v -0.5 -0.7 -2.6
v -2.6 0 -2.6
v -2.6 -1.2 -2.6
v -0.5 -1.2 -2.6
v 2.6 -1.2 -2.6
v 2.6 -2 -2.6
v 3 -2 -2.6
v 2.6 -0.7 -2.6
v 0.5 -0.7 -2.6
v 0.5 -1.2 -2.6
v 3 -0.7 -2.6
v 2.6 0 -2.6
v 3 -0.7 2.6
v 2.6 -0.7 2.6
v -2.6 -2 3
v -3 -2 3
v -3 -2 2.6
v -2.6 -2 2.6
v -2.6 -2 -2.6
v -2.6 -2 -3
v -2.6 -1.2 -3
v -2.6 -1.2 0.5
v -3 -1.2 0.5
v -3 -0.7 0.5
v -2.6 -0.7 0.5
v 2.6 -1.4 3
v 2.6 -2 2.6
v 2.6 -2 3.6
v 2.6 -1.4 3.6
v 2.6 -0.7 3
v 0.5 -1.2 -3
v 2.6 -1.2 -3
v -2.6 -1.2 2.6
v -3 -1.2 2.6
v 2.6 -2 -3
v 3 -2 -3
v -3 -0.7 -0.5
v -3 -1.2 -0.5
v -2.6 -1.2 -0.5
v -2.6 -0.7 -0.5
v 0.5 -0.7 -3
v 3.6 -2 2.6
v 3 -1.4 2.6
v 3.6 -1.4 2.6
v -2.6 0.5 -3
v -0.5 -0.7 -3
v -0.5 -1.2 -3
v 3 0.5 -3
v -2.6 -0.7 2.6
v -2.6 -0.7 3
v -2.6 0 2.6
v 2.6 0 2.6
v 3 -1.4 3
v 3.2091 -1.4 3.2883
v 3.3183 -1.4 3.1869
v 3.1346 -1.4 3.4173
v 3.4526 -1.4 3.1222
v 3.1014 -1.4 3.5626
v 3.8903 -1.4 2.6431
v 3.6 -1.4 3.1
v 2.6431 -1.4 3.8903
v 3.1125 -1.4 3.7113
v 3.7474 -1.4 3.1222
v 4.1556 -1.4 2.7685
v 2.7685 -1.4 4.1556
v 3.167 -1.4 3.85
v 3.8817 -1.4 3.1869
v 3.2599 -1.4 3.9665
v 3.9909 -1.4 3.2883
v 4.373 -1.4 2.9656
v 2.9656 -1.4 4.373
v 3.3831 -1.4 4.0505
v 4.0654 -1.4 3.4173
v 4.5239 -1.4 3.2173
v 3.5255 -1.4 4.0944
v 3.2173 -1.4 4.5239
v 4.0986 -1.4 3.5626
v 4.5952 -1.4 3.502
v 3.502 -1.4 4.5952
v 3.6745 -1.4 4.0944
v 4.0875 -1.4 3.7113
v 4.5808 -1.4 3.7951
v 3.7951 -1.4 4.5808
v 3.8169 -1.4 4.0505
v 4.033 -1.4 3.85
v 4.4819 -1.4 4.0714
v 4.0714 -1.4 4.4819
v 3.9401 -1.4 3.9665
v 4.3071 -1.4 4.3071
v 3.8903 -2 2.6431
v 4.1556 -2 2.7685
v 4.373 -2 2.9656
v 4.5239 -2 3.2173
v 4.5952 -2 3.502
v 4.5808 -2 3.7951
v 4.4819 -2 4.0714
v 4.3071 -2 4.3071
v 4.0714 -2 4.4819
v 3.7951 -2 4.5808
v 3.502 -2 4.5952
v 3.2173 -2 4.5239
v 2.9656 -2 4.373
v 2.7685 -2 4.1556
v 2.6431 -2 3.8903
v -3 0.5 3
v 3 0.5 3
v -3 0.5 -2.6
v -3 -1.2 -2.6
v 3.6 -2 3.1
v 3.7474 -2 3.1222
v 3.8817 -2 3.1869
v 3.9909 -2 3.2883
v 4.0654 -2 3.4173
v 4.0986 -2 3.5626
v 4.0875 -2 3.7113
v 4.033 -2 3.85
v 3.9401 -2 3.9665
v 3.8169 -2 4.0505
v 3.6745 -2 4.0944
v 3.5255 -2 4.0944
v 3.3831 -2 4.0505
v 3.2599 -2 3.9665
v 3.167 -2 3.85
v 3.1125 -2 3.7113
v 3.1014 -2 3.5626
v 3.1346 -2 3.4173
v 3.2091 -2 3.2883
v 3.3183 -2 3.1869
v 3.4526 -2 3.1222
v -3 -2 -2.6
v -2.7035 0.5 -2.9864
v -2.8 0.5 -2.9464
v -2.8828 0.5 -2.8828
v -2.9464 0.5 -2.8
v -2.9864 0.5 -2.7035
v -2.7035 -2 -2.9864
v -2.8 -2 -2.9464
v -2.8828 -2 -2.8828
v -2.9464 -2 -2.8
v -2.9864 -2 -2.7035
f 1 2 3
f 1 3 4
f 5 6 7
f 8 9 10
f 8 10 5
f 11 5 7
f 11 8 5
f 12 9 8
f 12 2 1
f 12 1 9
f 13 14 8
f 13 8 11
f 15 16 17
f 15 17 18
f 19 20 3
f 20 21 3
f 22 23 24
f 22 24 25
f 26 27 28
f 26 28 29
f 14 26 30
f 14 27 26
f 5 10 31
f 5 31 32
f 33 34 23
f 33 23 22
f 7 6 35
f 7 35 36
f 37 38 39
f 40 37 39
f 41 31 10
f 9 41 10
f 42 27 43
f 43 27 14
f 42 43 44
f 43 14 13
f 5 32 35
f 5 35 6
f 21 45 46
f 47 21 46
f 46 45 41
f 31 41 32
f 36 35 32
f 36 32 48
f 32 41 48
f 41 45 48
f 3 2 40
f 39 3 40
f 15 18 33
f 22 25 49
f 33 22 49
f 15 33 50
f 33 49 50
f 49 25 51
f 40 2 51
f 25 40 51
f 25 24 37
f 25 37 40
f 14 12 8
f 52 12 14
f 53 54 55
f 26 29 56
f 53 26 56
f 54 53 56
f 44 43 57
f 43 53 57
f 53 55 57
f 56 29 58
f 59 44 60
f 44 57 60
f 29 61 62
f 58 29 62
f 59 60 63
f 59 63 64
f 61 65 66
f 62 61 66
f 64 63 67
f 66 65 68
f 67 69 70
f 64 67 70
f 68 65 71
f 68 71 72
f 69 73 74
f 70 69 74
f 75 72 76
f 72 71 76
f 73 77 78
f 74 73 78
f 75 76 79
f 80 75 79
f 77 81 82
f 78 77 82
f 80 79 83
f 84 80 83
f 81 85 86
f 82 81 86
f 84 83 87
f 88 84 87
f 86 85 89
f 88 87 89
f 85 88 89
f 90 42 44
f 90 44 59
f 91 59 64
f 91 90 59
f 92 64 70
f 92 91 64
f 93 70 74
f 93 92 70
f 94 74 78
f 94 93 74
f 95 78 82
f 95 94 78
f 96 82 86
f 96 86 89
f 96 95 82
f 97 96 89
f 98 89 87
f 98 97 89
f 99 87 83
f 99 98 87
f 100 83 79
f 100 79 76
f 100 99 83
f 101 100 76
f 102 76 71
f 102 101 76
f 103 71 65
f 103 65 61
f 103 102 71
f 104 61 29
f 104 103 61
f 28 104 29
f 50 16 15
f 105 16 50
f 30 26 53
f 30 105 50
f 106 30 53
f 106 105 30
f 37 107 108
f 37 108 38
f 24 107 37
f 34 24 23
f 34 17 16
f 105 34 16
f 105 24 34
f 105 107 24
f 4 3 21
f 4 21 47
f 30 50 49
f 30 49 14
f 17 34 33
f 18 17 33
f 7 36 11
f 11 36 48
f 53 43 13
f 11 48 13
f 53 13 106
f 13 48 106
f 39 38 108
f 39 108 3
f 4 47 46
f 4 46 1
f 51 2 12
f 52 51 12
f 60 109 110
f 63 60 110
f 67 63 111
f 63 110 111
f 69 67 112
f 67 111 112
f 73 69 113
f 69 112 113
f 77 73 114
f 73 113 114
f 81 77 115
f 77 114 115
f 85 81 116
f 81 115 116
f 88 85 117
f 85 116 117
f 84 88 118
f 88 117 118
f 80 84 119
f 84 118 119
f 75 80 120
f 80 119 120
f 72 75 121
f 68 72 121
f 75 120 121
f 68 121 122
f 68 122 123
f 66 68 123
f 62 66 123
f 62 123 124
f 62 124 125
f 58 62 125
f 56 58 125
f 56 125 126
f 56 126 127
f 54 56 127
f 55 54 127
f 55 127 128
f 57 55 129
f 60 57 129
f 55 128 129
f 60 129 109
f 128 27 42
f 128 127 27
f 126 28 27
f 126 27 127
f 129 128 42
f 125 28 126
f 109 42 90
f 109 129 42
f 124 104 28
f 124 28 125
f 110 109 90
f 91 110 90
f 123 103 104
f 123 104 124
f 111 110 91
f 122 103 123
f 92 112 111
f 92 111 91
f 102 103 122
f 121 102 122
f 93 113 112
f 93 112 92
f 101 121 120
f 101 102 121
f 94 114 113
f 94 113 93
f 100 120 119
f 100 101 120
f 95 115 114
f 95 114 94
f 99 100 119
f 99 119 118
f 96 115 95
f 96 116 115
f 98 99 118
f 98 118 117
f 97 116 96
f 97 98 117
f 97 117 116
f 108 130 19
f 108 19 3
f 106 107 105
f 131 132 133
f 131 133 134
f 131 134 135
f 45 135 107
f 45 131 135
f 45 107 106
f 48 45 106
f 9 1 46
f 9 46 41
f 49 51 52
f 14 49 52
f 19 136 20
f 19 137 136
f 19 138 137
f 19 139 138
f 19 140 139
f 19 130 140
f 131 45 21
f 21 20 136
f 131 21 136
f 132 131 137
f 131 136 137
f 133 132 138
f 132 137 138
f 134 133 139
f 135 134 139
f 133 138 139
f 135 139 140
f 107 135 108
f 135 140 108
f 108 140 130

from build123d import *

# Parameters (mm, degrees)
SKETCH_1_W          = 6
SKETCH_1_H          = 6
EXTRUDE_1_DEPTH     = 0.5
SKETCH_2_W          = 6
SKETCH_2_H          = 6
SKETCH_2_W_2        = 5.2
SKETCH_2_H_2        = 5.2
EXTRUDE_2_DEPTH     = 2
SKETCH_3_W          = 5.2
SKETCH_3_H          = 1.8
CUT_EXTRUDE_1_DEPTH = 8
SKETCH_4_W          = 5.2
SKETCH_4_H          = 1.8
CUT_EXTRUDE_2_DEPTH = 8
SKETCH_5_R          = 0.5
EXTRUDE_3_DEPTH     = 0.6
SKETCH_6_W          = 5.2
SKETCH_6_H          = 0.4
EXTRUDE_4_DEPTH     = 0.5
SKETCH_7_W          = 0.4
SKETCH_7_H          = 5.2
EXTRUDE_5_DEPTH     = 0.5
SKETCH_8_W          = 0.4
SKETCH_8_H          = 5.2
EXTRUDE_6_DEPTH     = 1
SKETCH_9_W          = 5.2
SKETCH_9_H          = 0.4
EXTRUDE_7_DEPTH     = 1
SKETCH_10_W         = 0.4
SKETCH_10_H         = 1
SKETCH_10_W_2       = 1
SKETCH_10_H_2       = 0.4
CUT_EXTRUDE_3_DEPTH = 0.5
FILLET_2_R          = 0.4


with BuildPart() as part:
    # 草图1 → 凸台-拉伸1 (new body)
    with BuildSketch(Plane(origin=(0, 0, 0), x_dir=(1, 0, 0), z_dir=(0, 1, 0))):
        Rectangle(SKETCH_1_W, SKETCH_1_H)
    extrude(amount=EXTRUDE_1_DEPTH)

    # 草图2 → 凸台-拉伸2 (add)
    with BuildSketch(Plane.XZ):
        Rectangle(SKETCH_2_W, SKETCH_2_H)
        Rectangle(SKETCH_2_W_2, SKETCH_2_H_2, mode=Mode.SUBTRACT)
    extrude(amount=EXTRUDE_2_DEPTH)

    # 草图3 → 切除-拉伸1 (cut, through all)
    with BuildSketch(Plane.ZY.offset(3)):
        with Locations((0, -1.1)):
            Rectangle(SKETCH_3_W, SKETCH_3_H)
    extrude(amount=-CUT_EXTRUDE_1_DEPTH, mode=Mode.SUBTRACT)

    # 草图4 → 切除-拉伸2 (cut, through all)
    with BuildSketch(Plane(origin=(0, 0, -3), x_dir=(-1, 0, 0), z_dir=(0, 0, -1))):
        with Locations((0, -1.1)):
            Rectangle(SKETCH_4_W, SKETCH_4_H)
    extrude(amount=-CUT_EXTRUDE_2_DEPTH, mode=Mode.SUBTRACT)

    # 草图5 → 凸台-拉伸3 (add)
    with BuildSketch(Plane.XZ.offset(2)):
        with BuildLine():
            Line((3, 2.6), (3.6, 2.6))
            ThreePointArc((3.6, 2.6), (4.307106781, 4.307106781), (2.6, 3.6))
            Line((2.6, 3.6), (2.6, 3))
            Line((2.6, 3), (3, 3))
            Line((3, 3), (3, 2.6))
        make_face()
        with Locations(Location((3.6, 3.6, 0), (0, 0, 270))):
            Circle(SKETCH_5_R, mode=Mode.SUBTRACT)
    extrude(amount=-EXTRUDE_3_DEPTH)

    # 草图6 → 凸台-拉伸4 (add)
    with BuildSketch(Plane.XZ.offset(0.2)):
        with Locations((0, 2.8)):
            Rectangle(SKETCH_6_W, SKETCH_6_H)
    extrude(amount=EXTRUDE_4_DEPTH)

    # 草图7 → 凸台-拉伸5 (add)
    with BuildSketch(Plane.XZ.offset(0.2)):
        with Locations((2.8, 0)):
            Rectangle(SKETCH_7_W, SKETCH_7_H)
    extrude(amount=EXTRUDE_5_DEPTH)

    # 草图8 → 凸台-拉伸6 (add)
    with BuildSketch(Plane.XZ.offset(0.2)):
        with Locations((-2.8, 0)):
            Rectangle(SKETCH_8_W, SKETCH_8_H)
    extrude(amount=EXTRUDE_6_DEPTH)

    # 草图9 → 凸台-拉伸7 (add)
    with BuildSketch(Plane.XZ.offset(0.2)):
        with Locations((0, -2.8)):
            Rectangle(SKETCH_9_W, SKETCH_9_H)
    extrude(amount=EXTRUDE_7_DEPTH)

    # 草图10 → 切除-拉伸3 (cut)
    with BuildSketch(Plane.XZ.offset(1.2)):
        with Locations((-2.8, 0)):
            Rectangle(SKETCH_10_W, SKETCH_10_H)
        with Locations((0, -2.8)):
            Rectangle(SKETCH_10_W_2, SKETCH_10_H_2)
    extrude(amount=-CUT_EXTRUDE_3_DEPTH, mode=Mode.SUBTRACT)

    # 圆角2
    fillet_2_edges = [part.edges().sort_by_distance(p)[0] for p in [
        (-3, -0.75, -3),
    ]]
    fillet(fillet_2_edges, radius=FILLET_2_R)


solid = part.part
